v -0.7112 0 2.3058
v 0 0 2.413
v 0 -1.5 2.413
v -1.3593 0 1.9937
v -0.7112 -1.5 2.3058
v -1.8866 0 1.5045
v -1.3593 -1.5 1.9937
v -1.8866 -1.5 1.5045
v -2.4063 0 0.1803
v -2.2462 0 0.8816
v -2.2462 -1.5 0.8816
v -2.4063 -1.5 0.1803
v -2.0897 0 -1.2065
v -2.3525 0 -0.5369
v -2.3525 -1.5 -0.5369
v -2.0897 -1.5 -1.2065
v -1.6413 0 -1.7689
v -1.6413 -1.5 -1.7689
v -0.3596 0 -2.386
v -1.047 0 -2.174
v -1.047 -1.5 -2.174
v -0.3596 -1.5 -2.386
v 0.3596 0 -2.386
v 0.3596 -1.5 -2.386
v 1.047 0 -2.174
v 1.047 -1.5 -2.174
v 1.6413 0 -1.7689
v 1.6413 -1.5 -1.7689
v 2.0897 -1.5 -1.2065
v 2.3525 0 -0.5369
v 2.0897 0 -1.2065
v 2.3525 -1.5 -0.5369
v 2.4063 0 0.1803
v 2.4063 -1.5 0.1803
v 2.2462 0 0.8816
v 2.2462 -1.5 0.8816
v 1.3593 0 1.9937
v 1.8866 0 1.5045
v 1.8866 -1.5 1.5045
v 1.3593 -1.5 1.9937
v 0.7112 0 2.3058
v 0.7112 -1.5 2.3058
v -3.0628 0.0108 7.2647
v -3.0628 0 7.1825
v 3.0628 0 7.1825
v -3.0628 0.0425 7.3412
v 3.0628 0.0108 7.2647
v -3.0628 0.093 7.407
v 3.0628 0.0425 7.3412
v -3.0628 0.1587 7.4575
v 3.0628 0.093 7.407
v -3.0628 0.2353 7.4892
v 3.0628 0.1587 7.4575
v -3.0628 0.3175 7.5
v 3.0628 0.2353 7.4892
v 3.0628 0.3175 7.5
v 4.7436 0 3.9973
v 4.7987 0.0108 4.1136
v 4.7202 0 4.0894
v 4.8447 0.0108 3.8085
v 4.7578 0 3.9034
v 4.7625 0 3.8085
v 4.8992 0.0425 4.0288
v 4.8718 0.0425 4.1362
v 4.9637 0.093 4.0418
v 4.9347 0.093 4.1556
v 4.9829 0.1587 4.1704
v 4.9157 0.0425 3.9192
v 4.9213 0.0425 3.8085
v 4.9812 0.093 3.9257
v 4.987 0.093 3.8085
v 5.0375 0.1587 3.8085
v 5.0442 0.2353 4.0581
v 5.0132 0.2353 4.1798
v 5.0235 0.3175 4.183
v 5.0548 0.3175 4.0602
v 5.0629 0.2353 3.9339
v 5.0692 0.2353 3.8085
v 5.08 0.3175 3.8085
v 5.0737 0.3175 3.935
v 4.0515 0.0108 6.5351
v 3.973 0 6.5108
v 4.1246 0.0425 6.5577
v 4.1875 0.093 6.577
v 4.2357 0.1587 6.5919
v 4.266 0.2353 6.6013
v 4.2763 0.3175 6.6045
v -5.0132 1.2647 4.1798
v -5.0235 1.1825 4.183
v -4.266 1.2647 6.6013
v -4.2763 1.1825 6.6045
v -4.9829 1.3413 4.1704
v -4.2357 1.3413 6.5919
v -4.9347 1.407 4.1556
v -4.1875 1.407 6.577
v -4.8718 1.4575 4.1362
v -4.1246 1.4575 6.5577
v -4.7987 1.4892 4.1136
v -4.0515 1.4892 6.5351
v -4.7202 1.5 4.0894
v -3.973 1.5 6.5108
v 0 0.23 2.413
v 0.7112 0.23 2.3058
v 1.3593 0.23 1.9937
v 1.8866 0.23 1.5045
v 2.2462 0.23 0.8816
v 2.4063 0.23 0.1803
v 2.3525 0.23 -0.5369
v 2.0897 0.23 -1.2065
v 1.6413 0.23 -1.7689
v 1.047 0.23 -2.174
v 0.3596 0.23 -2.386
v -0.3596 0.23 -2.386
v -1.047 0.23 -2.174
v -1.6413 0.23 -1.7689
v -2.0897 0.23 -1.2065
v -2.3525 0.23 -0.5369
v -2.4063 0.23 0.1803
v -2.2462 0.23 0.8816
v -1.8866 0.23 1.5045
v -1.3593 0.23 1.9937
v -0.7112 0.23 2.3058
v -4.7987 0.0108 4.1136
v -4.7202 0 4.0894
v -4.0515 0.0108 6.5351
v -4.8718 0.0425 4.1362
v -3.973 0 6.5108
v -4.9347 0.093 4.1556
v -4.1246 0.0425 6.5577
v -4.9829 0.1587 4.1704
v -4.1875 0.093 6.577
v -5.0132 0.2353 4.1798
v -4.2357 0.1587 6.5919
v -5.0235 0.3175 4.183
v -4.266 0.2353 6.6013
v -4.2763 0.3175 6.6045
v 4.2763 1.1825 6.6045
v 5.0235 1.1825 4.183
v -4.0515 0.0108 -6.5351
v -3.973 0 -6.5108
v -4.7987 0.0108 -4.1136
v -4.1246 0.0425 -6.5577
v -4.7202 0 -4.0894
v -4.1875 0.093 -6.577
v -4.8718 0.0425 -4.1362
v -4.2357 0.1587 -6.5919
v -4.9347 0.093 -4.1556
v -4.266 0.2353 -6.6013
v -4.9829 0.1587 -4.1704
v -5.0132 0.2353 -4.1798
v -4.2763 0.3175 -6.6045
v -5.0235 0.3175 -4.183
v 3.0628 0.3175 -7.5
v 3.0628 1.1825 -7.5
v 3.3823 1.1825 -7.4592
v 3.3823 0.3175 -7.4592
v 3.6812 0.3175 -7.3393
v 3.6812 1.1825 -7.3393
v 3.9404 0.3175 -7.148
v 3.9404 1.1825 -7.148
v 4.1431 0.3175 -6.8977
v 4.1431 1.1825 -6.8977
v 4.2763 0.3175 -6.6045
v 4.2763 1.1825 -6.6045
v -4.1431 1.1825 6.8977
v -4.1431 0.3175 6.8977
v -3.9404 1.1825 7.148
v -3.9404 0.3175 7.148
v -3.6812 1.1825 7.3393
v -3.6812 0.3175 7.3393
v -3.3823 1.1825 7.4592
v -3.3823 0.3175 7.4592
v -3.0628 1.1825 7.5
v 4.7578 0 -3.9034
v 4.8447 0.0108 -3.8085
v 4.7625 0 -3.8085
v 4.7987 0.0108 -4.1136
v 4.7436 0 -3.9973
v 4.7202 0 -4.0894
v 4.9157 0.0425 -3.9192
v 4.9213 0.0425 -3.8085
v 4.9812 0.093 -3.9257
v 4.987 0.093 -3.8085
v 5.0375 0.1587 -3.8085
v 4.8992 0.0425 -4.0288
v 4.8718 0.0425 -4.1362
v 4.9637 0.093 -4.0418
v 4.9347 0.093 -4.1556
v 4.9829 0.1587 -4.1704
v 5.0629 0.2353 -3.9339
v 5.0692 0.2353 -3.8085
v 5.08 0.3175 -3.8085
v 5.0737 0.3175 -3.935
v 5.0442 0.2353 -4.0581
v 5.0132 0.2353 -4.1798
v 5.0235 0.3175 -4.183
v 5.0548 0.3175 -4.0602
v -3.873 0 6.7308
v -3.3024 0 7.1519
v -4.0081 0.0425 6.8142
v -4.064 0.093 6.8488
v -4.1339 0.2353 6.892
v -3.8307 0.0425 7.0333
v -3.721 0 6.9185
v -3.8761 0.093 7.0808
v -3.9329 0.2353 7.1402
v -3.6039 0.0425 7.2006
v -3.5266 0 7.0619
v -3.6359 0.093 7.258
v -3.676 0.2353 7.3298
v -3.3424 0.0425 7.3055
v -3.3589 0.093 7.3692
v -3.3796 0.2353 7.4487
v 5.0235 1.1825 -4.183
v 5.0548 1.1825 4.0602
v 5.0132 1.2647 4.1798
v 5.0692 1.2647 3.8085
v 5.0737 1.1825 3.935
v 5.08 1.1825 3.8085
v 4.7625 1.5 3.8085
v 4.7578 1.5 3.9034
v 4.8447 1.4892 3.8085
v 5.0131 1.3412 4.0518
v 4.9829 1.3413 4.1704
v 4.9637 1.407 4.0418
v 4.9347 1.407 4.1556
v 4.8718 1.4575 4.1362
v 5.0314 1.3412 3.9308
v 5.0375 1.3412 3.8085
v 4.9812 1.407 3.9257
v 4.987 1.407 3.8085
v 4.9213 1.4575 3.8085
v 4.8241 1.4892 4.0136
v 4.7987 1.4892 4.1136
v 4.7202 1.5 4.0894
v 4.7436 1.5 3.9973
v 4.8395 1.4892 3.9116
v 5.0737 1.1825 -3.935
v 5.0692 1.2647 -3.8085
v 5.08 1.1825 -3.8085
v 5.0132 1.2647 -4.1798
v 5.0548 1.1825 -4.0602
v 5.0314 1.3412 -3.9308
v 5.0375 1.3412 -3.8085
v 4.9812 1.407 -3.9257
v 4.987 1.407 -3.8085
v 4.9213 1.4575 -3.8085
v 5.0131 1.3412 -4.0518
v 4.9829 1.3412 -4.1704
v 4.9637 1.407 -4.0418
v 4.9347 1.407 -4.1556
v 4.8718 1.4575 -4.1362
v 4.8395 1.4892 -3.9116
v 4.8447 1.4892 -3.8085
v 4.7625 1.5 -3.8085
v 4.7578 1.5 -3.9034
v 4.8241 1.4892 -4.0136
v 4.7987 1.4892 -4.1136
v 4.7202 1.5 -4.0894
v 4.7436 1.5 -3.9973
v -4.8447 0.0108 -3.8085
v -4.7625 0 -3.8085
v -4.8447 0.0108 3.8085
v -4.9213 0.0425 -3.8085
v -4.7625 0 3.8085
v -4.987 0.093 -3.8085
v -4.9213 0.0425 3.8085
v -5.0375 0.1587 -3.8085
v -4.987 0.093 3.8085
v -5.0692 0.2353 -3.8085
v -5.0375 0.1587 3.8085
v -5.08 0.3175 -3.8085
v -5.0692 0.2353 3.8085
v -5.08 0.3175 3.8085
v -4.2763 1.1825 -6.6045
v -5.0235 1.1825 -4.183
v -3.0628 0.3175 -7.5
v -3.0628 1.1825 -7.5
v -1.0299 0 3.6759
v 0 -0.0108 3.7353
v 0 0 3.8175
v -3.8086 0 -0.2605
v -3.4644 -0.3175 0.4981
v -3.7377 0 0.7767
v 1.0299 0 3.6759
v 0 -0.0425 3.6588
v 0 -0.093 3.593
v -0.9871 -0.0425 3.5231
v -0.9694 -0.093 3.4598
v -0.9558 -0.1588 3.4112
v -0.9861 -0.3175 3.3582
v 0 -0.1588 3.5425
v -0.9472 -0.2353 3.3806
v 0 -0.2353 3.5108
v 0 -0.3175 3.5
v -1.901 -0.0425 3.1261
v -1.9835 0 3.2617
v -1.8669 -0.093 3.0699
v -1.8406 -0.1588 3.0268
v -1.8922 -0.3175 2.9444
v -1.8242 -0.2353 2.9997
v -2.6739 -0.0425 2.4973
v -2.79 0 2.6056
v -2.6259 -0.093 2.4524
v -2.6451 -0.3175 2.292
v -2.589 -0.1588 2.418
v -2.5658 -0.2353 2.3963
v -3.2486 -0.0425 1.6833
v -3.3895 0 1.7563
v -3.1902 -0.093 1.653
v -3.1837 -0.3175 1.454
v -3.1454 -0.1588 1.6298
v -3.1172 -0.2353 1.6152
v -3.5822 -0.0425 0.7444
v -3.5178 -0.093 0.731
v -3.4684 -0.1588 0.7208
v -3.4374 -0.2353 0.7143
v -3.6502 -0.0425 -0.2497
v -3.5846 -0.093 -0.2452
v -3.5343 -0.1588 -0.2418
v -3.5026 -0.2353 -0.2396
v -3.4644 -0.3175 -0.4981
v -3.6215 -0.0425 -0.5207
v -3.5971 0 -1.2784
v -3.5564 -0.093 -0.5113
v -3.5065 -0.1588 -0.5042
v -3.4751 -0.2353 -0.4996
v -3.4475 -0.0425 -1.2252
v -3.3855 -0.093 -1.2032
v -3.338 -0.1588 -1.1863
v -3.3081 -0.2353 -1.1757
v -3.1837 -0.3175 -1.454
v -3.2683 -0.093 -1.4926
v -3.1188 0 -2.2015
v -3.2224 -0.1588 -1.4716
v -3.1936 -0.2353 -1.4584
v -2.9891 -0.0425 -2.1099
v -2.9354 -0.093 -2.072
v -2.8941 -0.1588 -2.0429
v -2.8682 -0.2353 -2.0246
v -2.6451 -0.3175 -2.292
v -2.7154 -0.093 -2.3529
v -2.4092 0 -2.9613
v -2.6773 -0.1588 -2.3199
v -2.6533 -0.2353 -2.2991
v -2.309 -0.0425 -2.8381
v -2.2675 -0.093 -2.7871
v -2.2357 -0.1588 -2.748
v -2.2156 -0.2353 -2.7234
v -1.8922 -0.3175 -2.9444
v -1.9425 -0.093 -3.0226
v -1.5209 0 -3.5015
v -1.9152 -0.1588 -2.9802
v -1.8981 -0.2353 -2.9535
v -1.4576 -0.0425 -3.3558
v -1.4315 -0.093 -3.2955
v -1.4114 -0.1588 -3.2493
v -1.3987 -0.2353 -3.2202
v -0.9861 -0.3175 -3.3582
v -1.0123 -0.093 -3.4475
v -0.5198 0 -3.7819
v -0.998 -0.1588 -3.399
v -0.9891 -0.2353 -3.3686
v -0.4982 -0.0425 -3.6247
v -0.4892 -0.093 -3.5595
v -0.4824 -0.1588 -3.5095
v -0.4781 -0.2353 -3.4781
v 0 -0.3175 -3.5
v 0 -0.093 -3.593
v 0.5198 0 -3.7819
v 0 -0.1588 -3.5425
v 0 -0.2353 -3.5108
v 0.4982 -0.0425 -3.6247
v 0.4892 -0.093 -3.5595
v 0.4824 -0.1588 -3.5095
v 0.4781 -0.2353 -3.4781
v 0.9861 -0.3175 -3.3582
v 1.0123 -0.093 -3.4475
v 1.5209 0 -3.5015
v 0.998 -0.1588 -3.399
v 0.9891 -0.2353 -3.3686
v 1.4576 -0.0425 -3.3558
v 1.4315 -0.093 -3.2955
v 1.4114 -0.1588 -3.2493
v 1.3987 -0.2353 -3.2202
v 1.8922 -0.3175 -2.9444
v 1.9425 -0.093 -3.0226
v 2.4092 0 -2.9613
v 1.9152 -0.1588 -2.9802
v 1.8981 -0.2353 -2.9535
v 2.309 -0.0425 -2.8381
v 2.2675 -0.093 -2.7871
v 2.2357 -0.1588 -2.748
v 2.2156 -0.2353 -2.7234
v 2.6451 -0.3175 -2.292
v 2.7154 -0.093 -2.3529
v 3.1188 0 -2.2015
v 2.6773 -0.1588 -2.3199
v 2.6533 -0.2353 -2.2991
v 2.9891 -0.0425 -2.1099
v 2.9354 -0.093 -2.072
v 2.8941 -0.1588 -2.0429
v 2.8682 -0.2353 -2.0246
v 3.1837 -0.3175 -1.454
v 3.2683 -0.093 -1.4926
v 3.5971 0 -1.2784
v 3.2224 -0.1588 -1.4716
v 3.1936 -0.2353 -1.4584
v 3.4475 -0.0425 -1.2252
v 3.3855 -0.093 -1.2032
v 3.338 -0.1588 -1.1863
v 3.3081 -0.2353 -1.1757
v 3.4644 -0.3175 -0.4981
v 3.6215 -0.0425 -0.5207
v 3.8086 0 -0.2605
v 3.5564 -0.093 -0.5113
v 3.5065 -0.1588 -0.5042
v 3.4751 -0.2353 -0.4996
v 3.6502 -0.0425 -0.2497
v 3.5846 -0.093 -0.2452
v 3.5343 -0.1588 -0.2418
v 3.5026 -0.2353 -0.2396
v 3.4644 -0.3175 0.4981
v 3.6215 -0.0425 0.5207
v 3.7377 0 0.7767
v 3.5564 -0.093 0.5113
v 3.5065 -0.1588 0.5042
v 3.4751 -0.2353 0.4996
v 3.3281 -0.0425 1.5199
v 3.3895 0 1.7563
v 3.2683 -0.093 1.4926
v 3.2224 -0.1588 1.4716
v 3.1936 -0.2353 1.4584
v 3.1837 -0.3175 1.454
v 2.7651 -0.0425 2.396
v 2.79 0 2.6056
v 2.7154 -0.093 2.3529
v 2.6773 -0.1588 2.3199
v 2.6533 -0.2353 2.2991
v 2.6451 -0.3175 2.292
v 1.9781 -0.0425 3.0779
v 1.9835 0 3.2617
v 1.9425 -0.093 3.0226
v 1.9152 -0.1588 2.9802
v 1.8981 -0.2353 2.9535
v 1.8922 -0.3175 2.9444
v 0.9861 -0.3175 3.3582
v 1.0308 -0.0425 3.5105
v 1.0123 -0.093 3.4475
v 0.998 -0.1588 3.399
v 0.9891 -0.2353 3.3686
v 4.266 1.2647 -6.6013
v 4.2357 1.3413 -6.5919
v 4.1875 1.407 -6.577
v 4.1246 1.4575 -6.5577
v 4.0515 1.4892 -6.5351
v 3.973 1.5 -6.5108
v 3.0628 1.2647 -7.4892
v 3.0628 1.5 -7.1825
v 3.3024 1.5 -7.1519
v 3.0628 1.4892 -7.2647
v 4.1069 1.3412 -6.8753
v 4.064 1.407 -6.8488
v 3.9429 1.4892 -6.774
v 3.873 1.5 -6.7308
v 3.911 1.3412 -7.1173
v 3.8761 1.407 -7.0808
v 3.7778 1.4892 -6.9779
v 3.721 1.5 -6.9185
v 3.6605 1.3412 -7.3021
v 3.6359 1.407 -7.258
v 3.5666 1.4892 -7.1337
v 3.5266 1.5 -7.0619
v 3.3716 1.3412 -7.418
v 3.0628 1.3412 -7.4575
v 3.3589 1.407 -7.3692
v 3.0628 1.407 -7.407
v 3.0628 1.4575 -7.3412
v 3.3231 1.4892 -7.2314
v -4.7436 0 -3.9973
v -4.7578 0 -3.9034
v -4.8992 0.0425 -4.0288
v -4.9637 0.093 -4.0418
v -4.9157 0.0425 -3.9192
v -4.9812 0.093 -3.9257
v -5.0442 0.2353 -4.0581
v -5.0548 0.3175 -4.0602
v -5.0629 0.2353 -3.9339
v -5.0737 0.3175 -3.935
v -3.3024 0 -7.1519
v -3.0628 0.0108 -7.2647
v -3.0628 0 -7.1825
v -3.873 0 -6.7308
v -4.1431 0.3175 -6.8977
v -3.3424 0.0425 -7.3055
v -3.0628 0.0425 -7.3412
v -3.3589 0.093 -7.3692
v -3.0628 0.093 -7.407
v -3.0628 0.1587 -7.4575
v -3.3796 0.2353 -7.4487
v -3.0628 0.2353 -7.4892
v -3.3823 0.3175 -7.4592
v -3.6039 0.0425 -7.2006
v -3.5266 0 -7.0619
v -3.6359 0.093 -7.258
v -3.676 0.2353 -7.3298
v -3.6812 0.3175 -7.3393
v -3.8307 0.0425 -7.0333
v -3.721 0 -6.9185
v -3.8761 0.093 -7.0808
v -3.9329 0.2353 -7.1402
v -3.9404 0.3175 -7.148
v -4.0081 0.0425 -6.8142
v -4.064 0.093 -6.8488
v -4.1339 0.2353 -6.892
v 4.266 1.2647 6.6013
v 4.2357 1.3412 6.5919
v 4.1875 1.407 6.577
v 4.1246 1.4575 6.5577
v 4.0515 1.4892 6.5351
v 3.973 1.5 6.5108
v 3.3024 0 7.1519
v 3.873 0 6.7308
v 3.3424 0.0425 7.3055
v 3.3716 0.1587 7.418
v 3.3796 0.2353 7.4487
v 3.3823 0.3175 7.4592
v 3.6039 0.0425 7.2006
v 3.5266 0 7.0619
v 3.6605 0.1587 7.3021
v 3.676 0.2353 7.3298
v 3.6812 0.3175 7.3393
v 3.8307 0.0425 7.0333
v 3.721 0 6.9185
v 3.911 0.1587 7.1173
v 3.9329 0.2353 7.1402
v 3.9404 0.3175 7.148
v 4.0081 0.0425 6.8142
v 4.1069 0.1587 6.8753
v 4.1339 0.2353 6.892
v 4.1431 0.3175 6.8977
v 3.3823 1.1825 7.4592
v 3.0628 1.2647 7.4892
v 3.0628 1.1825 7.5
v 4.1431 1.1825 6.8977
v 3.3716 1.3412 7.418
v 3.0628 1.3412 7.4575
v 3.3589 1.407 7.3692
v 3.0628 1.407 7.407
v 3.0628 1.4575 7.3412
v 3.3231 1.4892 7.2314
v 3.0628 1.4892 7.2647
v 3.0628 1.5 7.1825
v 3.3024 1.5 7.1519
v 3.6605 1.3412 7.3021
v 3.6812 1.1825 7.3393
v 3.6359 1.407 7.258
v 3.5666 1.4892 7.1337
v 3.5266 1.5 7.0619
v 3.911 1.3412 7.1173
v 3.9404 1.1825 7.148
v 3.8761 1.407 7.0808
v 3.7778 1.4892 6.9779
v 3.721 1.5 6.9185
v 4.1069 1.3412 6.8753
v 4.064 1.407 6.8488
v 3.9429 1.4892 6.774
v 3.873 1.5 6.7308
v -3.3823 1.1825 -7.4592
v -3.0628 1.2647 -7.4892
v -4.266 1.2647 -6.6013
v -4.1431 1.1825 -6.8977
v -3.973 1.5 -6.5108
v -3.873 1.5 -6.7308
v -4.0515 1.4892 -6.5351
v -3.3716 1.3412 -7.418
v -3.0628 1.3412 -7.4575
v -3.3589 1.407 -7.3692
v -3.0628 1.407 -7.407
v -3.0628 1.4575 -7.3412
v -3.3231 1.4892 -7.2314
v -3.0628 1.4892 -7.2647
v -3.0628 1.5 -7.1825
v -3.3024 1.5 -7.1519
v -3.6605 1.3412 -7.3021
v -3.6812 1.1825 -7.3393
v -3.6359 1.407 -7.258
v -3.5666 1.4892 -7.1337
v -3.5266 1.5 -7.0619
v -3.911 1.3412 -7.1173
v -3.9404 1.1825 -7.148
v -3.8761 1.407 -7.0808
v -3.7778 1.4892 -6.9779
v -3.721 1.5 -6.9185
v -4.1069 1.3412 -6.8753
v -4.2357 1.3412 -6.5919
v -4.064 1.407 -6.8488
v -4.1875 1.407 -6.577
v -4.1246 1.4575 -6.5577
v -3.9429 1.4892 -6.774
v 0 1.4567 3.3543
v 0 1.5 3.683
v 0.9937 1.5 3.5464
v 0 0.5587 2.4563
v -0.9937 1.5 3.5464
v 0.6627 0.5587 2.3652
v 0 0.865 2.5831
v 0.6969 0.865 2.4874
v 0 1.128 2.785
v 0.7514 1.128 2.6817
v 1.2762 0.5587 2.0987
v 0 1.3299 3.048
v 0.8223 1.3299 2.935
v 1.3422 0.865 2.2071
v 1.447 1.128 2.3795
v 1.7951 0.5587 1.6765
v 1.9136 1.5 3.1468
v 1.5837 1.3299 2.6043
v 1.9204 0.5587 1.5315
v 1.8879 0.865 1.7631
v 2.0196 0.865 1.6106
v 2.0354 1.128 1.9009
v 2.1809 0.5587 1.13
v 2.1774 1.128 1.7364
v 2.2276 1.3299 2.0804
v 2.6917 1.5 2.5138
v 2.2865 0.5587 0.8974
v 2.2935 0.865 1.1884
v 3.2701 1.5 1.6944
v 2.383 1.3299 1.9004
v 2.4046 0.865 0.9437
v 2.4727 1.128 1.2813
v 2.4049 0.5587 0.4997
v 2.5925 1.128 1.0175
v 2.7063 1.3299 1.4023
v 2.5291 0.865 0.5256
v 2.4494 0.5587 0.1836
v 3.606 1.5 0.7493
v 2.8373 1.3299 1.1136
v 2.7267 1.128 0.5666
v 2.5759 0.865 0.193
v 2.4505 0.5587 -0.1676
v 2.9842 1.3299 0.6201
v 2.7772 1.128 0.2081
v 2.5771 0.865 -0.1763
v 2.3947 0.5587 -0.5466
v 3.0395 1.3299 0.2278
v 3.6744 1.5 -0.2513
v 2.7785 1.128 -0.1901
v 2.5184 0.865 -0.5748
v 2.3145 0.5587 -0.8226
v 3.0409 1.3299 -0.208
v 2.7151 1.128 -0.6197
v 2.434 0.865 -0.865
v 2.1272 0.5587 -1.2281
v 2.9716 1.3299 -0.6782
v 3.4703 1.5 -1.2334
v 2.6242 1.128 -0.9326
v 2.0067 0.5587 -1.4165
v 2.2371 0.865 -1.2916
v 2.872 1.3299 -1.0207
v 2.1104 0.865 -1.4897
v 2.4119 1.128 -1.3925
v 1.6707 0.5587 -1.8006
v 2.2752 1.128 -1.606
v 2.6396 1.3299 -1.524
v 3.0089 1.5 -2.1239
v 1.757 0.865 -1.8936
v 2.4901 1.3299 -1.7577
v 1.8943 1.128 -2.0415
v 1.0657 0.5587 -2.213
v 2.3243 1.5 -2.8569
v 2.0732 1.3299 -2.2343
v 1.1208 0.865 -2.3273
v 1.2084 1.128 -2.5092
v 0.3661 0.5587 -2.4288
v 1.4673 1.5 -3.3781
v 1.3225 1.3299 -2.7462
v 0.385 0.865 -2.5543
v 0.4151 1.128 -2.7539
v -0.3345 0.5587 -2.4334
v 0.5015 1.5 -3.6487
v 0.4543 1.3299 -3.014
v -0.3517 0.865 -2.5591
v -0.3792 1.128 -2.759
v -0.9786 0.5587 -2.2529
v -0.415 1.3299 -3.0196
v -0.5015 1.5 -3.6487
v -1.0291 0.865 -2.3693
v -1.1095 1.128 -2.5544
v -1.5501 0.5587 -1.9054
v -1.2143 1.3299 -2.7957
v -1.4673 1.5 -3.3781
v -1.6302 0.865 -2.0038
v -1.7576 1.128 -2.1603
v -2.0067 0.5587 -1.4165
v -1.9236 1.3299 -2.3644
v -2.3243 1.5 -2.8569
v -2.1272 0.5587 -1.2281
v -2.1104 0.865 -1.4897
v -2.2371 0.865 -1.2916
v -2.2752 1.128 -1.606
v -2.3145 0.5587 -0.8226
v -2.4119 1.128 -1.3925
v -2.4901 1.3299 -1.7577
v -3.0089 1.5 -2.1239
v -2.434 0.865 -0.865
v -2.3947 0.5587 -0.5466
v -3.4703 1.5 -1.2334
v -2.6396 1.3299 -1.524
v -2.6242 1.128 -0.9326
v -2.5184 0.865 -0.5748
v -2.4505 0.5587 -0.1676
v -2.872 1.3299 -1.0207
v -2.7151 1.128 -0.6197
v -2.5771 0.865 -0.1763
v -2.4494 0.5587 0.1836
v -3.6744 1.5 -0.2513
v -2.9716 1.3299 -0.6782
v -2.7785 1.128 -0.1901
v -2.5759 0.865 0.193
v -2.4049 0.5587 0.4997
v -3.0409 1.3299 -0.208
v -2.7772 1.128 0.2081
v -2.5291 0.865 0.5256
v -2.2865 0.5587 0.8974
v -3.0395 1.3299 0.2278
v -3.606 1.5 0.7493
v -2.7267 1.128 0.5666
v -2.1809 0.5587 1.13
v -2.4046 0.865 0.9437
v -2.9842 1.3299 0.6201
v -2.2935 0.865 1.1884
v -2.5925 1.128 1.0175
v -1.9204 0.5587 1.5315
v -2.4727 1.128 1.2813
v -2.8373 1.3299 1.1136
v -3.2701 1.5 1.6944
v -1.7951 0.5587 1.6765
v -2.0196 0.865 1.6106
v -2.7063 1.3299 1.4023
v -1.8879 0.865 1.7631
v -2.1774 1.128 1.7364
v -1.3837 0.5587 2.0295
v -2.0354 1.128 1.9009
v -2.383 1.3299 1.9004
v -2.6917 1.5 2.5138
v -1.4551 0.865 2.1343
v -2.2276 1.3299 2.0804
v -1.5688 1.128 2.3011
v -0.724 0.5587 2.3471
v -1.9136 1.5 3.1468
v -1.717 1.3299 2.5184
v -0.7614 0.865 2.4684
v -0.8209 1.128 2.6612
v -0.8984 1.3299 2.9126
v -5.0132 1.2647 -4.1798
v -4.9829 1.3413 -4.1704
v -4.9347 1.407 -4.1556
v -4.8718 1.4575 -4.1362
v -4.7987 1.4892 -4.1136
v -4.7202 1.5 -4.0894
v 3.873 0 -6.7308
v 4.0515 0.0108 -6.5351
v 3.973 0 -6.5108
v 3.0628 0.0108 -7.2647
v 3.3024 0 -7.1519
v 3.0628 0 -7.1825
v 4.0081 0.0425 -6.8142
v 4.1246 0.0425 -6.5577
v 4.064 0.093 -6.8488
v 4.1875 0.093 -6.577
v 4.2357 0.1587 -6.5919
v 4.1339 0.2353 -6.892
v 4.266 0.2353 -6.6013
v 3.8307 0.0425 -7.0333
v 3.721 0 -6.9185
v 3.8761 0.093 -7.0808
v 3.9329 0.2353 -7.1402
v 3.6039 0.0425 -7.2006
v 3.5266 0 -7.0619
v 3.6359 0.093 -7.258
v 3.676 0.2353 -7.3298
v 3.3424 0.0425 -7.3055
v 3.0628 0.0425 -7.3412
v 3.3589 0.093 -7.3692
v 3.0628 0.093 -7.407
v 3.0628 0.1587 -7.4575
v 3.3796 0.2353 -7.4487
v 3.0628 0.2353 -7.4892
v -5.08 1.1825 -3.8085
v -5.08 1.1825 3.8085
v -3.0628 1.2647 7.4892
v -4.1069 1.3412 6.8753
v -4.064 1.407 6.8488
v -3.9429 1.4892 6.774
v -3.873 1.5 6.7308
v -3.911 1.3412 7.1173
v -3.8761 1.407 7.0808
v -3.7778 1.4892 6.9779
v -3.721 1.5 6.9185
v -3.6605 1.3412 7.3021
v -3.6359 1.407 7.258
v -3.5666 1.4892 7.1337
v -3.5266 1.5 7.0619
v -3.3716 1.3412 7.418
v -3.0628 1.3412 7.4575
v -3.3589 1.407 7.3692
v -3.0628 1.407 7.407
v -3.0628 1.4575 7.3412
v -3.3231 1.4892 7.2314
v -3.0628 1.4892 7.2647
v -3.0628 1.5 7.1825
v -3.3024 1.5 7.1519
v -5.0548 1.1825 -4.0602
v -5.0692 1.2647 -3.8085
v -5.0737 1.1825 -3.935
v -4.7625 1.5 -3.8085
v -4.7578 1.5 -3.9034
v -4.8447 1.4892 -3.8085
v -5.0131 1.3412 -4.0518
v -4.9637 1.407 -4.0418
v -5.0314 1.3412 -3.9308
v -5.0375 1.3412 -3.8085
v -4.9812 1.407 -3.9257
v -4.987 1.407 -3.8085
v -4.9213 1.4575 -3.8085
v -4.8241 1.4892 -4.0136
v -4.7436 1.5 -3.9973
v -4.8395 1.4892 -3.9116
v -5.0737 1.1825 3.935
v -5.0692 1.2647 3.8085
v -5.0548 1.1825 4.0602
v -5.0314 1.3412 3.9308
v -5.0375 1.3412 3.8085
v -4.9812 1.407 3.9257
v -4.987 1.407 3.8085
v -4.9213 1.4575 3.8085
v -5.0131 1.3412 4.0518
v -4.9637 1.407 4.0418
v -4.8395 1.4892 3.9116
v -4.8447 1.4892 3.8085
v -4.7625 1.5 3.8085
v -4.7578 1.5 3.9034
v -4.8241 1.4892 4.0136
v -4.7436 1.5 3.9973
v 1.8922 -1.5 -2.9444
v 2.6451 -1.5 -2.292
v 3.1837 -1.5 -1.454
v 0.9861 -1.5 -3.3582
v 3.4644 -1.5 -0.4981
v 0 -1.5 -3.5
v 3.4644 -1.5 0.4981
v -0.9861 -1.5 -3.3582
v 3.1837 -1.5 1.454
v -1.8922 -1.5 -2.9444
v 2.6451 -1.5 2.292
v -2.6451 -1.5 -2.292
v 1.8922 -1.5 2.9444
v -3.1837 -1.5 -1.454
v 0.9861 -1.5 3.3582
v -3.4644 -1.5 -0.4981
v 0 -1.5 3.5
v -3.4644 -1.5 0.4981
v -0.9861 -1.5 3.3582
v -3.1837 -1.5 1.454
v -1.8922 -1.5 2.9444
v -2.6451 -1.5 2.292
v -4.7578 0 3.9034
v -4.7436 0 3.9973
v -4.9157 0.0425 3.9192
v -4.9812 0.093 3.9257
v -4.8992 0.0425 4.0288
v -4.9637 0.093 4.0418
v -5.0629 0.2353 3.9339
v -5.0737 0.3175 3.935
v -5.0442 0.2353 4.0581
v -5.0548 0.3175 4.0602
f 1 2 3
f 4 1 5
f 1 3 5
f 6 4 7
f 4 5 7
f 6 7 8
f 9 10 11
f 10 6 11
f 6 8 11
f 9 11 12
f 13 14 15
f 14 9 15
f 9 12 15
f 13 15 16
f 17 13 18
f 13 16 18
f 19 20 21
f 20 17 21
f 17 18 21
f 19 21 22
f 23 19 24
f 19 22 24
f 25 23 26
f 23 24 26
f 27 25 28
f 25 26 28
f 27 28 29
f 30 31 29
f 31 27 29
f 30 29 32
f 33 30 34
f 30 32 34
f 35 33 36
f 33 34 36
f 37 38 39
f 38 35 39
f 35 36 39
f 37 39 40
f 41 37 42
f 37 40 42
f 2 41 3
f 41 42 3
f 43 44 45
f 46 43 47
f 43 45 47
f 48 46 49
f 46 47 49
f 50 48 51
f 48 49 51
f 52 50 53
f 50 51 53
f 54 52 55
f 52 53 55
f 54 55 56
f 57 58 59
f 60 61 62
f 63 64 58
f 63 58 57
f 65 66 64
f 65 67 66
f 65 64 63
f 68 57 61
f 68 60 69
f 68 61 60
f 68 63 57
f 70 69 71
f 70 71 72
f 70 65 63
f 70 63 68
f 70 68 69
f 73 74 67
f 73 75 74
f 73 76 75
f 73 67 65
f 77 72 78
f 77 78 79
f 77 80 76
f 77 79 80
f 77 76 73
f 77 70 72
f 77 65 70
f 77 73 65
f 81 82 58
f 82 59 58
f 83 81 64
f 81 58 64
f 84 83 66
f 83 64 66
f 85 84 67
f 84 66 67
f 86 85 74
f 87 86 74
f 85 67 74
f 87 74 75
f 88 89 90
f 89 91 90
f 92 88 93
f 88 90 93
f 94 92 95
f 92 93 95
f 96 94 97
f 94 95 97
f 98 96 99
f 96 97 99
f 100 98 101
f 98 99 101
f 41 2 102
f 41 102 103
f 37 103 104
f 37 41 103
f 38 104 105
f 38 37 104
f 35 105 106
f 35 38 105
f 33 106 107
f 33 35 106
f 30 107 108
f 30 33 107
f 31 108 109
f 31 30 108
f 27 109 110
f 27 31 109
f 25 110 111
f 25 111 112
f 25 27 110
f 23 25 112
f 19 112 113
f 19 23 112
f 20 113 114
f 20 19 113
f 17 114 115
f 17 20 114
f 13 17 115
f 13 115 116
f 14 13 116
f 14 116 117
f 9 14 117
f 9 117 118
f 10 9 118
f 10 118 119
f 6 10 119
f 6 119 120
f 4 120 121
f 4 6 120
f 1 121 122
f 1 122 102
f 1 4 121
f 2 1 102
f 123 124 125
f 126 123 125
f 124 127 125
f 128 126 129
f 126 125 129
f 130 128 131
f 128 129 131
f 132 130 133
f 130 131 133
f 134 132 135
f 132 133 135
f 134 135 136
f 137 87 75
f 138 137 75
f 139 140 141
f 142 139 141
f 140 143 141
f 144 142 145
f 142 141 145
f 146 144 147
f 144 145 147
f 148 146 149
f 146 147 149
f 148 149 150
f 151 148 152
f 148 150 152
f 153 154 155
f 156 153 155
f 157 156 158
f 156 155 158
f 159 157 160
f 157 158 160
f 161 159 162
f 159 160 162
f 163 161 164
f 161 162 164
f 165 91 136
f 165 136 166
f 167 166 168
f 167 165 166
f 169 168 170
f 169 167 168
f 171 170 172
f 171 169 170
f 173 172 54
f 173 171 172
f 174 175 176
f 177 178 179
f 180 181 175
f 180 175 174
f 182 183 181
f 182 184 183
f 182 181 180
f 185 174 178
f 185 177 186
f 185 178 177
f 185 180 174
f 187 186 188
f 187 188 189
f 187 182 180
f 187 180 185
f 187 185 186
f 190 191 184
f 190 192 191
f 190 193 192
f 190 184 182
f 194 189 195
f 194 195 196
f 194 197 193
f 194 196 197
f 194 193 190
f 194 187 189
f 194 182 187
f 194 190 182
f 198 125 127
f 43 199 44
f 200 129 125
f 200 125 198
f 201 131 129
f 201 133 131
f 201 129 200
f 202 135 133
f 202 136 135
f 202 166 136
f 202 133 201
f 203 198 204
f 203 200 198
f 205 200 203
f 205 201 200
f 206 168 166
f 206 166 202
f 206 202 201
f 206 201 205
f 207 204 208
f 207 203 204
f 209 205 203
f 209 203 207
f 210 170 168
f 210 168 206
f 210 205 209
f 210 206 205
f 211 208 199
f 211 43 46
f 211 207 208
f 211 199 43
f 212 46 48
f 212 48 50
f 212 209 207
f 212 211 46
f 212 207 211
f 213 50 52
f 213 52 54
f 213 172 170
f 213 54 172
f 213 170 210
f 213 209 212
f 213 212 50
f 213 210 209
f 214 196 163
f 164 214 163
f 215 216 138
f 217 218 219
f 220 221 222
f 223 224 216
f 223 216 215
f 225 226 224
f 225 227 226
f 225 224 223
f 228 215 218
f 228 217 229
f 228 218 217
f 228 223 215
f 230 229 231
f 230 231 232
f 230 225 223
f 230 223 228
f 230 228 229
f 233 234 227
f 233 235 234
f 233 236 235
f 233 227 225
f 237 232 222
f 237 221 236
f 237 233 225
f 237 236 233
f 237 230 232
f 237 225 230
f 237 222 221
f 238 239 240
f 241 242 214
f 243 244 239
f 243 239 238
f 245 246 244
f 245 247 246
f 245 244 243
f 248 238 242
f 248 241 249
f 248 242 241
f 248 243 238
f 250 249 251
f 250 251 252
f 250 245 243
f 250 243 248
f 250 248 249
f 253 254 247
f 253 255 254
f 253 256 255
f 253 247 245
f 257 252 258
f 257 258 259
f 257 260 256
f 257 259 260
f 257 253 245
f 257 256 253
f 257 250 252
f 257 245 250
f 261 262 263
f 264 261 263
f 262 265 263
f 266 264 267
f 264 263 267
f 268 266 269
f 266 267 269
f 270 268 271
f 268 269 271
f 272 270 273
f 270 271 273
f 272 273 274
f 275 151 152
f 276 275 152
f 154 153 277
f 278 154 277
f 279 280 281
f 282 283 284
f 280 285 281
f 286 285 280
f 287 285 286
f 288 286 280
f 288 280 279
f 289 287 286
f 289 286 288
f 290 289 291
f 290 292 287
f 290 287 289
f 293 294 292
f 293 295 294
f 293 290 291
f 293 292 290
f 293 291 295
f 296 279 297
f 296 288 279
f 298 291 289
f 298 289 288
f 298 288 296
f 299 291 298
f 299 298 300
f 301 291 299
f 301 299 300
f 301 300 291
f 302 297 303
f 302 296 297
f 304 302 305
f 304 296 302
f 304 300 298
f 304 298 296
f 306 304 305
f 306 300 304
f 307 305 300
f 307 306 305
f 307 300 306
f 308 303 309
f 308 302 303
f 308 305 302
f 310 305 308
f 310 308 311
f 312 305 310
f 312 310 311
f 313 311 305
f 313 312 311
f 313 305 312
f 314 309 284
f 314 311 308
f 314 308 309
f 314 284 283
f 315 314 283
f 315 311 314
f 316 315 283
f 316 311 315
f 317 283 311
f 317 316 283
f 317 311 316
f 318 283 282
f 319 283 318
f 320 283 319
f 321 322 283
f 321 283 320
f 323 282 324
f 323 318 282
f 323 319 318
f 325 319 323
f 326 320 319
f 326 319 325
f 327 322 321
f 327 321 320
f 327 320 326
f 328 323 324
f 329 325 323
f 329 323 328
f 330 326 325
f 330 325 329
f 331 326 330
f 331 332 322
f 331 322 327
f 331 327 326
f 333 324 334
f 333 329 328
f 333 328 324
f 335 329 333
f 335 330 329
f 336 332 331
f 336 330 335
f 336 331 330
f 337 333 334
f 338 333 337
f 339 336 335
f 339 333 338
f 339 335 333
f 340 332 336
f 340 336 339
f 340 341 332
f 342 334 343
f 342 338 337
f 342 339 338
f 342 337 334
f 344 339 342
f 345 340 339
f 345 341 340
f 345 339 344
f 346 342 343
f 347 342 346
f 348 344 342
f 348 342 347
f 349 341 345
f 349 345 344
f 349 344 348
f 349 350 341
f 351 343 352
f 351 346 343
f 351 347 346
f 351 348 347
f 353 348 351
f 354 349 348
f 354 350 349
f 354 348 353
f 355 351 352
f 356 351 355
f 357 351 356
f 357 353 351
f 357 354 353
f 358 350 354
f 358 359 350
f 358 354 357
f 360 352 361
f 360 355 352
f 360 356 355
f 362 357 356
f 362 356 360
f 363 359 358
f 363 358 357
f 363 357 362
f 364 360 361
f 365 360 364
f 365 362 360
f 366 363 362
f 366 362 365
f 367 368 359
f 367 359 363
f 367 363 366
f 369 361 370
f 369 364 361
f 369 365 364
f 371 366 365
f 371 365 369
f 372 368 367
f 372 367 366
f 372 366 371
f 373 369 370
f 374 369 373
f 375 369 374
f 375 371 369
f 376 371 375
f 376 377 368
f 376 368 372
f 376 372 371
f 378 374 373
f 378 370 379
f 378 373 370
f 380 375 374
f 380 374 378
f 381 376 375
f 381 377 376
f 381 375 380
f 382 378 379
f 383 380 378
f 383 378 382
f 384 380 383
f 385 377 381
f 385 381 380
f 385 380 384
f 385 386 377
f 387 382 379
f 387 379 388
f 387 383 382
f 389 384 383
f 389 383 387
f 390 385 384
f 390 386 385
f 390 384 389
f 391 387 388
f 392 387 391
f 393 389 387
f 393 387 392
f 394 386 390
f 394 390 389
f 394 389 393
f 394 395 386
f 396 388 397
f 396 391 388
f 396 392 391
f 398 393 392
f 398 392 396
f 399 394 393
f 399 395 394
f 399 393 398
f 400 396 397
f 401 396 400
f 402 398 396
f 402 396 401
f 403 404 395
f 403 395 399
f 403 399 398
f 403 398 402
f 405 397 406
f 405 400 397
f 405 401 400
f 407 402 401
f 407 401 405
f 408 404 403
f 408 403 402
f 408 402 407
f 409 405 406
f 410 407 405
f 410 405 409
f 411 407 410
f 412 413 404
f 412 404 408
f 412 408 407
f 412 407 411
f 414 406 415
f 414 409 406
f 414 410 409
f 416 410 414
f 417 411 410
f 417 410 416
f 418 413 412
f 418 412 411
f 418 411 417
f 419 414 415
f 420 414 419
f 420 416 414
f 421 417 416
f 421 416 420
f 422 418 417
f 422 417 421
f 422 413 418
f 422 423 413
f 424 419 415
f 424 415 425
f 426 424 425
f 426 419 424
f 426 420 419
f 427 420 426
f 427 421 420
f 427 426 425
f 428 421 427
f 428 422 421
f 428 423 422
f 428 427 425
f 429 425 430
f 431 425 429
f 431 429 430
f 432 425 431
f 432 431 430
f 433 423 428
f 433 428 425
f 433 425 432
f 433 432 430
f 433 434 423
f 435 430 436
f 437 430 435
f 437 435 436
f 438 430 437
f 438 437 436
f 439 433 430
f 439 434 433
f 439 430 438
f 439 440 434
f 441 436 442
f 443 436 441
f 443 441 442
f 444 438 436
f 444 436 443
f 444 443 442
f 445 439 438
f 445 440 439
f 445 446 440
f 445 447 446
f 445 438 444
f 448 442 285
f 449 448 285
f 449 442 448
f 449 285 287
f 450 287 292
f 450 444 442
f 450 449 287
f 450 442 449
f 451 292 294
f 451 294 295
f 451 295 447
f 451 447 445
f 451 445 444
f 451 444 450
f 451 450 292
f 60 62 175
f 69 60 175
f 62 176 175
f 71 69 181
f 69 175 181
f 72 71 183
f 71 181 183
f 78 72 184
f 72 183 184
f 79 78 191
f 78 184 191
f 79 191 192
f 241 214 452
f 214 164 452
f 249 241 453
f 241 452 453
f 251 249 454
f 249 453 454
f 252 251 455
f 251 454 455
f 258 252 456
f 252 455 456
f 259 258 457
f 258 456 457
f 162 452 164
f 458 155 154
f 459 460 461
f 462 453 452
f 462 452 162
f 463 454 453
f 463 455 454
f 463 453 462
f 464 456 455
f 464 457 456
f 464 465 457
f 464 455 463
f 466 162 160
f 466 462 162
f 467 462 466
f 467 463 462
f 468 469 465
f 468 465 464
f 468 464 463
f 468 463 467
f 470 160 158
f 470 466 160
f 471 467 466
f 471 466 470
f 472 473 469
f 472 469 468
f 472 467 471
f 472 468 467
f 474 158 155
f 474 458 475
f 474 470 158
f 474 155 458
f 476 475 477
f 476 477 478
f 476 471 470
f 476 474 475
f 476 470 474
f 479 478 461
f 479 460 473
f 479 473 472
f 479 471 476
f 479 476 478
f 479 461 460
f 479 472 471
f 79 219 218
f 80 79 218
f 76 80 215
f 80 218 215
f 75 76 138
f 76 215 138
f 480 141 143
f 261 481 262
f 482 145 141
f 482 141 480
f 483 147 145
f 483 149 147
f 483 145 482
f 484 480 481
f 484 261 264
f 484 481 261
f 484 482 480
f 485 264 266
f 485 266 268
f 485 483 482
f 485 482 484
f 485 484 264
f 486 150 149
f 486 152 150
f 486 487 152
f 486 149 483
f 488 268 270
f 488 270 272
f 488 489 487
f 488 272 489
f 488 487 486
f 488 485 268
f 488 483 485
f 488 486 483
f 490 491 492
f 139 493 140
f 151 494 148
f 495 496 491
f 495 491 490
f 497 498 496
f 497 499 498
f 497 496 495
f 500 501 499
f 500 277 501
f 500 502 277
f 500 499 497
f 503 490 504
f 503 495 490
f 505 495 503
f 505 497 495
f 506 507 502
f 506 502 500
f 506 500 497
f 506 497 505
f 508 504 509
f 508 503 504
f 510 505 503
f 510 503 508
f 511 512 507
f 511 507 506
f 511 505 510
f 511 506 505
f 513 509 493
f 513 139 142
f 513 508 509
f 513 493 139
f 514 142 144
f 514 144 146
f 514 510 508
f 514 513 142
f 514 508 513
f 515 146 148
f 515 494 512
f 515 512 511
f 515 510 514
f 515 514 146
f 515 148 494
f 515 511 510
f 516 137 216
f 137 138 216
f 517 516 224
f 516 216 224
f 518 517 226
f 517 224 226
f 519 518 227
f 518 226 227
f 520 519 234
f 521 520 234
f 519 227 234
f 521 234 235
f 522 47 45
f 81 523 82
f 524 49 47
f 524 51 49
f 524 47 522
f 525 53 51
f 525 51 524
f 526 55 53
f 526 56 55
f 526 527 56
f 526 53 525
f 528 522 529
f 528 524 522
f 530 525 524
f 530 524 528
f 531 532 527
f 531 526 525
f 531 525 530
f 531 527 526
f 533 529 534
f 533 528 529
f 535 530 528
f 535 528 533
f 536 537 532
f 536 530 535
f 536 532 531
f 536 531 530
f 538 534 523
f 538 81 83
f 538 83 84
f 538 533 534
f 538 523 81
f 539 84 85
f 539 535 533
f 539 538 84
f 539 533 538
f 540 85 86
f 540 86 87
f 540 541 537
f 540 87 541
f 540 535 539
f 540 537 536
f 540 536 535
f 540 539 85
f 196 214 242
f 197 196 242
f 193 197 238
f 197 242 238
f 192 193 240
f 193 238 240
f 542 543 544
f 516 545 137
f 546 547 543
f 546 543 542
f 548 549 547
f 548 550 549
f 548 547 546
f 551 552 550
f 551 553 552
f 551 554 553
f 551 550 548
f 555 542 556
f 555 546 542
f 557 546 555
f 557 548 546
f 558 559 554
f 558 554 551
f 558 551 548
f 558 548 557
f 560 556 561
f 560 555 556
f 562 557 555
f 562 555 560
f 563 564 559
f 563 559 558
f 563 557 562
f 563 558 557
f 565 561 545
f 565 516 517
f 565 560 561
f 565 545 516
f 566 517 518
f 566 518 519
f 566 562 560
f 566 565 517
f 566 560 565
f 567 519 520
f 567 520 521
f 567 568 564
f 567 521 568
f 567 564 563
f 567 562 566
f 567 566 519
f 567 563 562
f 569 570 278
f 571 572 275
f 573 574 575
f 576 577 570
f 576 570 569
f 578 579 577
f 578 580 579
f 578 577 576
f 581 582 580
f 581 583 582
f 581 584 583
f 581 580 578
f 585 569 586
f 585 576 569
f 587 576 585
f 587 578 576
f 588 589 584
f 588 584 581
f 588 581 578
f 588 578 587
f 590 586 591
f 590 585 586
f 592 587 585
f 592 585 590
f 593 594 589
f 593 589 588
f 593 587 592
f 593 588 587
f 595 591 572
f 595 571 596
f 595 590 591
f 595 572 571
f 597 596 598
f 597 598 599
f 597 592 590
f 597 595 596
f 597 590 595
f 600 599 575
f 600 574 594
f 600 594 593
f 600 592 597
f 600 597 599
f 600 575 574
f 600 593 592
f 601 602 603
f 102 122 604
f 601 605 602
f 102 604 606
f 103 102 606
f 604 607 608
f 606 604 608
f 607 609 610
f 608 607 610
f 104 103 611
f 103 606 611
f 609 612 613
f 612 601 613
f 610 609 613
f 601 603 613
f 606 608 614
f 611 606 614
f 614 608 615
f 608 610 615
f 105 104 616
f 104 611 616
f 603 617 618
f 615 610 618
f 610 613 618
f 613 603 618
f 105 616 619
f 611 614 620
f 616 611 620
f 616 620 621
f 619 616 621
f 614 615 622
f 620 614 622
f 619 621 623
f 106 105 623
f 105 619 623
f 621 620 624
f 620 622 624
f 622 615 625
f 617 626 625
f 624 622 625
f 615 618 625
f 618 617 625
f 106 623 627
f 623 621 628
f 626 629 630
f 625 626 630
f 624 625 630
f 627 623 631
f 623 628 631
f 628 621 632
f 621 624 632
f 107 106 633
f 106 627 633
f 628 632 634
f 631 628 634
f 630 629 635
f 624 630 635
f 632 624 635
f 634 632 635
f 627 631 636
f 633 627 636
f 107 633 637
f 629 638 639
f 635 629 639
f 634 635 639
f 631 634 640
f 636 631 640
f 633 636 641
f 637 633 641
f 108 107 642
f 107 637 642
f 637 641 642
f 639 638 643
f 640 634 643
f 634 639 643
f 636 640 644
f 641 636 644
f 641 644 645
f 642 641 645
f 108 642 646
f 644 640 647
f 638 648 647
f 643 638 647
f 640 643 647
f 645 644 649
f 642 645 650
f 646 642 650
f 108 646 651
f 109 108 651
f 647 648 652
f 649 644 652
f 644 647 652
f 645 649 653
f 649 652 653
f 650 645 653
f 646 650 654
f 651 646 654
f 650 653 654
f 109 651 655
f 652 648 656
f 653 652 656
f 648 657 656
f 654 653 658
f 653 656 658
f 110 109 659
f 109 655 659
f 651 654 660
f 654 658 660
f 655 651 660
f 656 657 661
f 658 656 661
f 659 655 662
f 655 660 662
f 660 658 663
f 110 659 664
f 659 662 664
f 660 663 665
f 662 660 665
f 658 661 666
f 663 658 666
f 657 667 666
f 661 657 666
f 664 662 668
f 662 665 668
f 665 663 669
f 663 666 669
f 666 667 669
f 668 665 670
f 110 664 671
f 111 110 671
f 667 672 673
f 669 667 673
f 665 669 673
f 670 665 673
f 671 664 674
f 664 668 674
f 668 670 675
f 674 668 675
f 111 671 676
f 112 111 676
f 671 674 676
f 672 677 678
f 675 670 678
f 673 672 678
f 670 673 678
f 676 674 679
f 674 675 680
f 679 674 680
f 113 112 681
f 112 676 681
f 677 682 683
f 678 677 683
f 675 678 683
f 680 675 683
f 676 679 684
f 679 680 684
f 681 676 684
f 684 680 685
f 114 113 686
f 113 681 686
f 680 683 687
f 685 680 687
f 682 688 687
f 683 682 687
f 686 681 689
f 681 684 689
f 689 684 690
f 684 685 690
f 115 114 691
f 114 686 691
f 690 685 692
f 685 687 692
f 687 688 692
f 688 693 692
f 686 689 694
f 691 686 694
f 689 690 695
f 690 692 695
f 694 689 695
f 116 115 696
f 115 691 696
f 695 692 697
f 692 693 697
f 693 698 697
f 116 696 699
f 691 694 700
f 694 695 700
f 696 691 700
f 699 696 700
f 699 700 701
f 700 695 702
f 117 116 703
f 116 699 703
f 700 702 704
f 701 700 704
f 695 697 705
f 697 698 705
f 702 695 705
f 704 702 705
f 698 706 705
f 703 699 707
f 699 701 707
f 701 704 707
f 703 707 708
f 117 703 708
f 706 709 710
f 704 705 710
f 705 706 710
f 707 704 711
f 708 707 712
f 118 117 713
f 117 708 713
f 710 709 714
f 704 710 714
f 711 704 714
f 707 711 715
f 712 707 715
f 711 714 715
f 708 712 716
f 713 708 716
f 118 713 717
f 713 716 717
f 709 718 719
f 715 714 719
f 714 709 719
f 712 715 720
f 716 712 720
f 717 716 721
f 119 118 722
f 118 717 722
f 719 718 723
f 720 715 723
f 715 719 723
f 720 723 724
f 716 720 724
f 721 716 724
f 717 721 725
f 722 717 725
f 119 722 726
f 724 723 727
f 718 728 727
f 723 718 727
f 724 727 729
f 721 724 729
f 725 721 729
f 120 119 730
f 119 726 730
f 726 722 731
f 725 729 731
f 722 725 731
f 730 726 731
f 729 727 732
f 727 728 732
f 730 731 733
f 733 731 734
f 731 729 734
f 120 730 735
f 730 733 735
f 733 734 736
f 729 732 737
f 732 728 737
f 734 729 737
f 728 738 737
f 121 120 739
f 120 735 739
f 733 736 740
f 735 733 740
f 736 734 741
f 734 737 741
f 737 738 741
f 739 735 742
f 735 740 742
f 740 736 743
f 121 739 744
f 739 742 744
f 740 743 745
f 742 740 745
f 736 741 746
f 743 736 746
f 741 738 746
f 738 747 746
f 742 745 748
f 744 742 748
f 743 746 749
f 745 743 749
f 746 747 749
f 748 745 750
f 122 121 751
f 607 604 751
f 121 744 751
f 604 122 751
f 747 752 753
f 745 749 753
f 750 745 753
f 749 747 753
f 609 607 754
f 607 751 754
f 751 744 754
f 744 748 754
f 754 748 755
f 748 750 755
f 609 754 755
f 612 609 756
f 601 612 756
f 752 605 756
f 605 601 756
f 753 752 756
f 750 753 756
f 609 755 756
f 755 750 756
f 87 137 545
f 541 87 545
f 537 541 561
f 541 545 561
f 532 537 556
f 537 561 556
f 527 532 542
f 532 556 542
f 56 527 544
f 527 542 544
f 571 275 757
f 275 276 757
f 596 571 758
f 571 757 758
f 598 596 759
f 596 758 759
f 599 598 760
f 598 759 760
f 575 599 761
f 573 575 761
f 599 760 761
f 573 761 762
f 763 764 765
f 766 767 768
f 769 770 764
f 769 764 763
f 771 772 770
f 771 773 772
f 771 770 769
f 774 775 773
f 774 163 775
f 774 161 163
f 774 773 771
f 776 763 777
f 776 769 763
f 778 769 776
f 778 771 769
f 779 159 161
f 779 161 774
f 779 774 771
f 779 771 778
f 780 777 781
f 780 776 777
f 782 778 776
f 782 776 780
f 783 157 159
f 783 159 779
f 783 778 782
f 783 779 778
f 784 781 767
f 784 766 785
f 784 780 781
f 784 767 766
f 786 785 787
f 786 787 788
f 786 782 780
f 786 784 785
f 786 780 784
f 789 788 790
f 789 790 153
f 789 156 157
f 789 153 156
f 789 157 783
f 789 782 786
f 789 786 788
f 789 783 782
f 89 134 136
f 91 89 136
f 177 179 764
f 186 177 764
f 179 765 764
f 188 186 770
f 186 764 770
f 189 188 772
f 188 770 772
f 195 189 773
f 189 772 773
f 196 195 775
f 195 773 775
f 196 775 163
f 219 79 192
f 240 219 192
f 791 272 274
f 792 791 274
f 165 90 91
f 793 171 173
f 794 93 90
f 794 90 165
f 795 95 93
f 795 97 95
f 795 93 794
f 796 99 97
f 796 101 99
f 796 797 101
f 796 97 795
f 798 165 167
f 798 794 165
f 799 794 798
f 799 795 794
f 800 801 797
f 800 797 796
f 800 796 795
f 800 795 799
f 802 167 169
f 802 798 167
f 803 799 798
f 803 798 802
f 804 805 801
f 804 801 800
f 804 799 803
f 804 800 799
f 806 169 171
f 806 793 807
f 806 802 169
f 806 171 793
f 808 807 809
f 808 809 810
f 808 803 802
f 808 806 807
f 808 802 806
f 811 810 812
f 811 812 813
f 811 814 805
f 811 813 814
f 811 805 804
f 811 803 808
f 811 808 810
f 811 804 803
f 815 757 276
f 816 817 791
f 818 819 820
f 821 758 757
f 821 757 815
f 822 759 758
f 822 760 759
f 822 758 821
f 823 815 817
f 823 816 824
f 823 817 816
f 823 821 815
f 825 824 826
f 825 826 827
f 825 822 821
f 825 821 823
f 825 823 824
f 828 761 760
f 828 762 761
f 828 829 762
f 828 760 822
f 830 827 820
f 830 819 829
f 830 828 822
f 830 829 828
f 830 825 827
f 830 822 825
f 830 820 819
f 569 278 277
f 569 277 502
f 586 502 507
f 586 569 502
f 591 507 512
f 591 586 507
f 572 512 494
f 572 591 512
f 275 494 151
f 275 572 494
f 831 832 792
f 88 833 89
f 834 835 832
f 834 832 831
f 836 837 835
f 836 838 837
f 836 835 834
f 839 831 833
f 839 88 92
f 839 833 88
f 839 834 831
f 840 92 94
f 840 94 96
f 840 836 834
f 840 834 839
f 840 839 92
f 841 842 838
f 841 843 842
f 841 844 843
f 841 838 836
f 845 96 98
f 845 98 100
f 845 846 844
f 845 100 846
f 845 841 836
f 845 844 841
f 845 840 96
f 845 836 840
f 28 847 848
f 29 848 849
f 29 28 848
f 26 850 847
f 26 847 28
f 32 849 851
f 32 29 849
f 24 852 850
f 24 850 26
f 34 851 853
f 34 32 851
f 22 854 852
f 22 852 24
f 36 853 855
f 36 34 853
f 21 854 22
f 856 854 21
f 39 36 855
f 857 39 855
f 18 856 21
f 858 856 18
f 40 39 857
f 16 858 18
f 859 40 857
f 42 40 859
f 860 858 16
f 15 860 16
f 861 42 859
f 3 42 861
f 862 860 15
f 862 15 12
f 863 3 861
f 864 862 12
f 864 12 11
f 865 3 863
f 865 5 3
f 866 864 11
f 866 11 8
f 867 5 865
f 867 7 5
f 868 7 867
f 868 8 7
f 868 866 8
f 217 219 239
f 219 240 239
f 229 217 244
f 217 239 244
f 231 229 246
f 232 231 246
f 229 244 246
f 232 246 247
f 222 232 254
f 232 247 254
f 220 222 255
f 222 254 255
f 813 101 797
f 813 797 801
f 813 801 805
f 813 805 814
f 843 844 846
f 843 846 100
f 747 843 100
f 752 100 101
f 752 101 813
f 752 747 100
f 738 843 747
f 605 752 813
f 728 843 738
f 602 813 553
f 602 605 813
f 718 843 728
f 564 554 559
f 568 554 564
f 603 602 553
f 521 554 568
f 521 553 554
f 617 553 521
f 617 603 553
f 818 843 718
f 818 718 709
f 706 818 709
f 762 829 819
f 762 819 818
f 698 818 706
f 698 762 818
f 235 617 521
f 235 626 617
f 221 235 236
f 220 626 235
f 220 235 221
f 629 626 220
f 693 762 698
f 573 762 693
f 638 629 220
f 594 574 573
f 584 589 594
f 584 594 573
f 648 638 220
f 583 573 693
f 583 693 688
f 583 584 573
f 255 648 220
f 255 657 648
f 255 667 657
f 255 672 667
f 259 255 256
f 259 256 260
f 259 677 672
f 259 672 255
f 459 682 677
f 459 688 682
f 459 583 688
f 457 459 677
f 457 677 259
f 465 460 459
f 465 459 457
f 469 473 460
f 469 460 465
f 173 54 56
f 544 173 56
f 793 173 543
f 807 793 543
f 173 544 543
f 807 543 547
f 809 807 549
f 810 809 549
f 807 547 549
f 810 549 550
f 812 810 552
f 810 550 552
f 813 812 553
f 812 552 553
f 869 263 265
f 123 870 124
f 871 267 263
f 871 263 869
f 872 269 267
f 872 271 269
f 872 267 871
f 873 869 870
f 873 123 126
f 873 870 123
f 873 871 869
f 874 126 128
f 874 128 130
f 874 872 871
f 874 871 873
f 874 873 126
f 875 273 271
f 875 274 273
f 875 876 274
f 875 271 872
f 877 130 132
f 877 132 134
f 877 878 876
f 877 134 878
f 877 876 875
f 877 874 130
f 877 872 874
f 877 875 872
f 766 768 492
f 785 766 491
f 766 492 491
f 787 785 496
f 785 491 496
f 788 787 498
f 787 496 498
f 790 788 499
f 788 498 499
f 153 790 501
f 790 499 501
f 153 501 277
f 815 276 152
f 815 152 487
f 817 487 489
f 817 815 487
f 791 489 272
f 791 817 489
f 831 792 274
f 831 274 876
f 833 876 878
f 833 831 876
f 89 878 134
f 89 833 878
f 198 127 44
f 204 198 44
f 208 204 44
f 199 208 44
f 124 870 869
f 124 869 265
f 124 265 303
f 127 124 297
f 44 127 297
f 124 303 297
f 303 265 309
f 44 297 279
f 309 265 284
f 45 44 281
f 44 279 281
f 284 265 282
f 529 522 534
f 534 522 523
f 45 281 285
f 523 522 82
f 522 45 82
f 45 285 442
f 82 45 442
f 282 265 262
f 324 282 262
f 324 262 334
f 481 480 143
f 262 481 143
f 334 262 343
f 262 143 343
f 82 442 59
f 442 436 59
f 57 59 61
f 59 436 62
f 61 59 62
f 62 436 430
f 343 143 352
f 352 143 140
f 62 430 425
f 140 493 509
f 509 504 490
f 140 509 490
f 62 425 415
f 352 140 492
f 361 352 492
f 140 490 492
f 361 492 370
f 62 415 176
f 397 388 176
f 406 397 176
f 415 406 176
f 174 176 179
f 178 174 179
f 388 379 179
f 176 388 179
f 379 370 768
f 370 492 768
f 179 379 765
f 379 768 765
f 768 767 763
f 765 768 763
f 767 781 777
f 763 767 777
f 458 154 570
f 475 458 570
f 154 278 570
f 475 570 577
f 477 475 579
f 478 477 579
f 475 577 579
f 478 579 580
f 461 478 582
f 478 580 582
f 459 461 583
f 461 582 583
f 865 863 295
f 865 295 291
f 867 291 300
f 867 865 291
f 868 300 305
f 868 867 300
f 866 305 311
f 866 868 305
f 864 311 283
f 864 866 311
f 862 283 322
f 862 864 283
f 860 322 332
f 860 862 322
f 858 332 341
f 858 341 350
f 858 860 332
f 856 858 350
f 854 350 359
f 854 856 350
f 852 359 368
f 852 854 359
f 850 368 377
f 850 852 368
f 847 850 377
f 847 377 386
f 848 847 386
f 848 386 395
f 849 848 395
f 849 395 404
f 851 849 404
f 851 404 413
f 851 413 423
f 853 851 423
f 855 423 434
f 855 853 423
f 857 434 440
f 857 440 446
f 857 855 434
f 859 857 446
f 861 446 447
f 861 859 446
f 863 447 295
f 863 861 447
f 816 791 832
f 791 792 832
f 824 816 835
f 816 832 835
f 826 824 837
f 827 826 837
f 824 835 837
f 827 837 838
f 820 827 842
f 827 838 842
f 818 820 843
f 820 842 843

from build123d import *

# Parameters (mm, degrees)
SKETCH1_R           = 2.413
BOSS_EXTRUDE1_DEPTH = 1.5
BOSS_EXTRUDE2_START = 1.5
SKETCH2_R           = 3.5
SKETCH2_R_2         = 2.413
BOSS_EXTRUDE2_DEPTH = 1.5
FILLET1_R           = 1.27
FILLET2_R           = 0.3175


with BuildPart() as part:
    # Sketch1 → Boss-Extrude1 (new body)
    with BuildSketch(Plane(origin=(0, 0, 0), x_dir=(1, 0, 0), z_dir=(0, 1, 0))):
        Polygon((4, 7.5), (-4, 7.5), (-5.08, 4), (-5.08, -4), (-4, -7.5), (4, -7.5), (5.08, -4), (5.08, 4), align=None)
        with Locations(Location((0, 0, 0), (0, 0, 270))):
            Circle(SKETCH1_R, mode=Mode.SUBTRACT)
    extrude(amount=BOSS_EXTRUDE1_DEPTH)

    # Sketch2 → Boss-Extrude2 (add)
    with BuildSketch(Plane.XZ.offset(BOSS_EXTRUDE2_START)):
        with Locations(Location((0, 0, 0), (0, 0, 90))):
            Circle(SKETCH2_R)
        with Locations(Location((0, 0, 0), (0, 0, 90))):
            Circle(SKETCH2_R_2, mode=Mode.SUBTRACT)
    extrude(amount=-BOSS_EXTRUDE2_DEPTH)

    # Fillet1
    fillet1_edges = [part.edges().sort_by_distance(p)[0] for p in [
        (-5.08, 0.75, 4),
        (-5.08, 0.75, -4),
        (-4, 0.75, -7.5),
        (4, 0.75, -7.5),
        (5.08, 0.75, -4),
        (5.08, 0.75, 4),
        (4, 0.75, 7.5),
        (-4, 0.75, 7.5),
        (0, 1.5, -2.413),
    ]]
    fillet(fillet1_edges, radius=FILLET1_R)

    # Fillet2
    fillet2_edges = [part.edges().sort_by_distance(p)[0] for p in [
        (0, 0, -3.5),
        (-4.64993803, 1.5, 5.393719347),
        (0, 1.5, 7.5),
        (4.64993803, 1.5, 5.393719347),
        (5.08, 1.5, 0),
        (4.64993803, 1.5, -5.393719347),
        (0, 1.5, -7.5),
        (-4.64993803, 1.5, -5.393719347),
        (-5.08, 1.5, 0),
        (5.065805445, 1.5, 3.997859771),
        (5.065805445, 1.5, -3.997859771),
        (3.816897156, 1.5, -7.251877837),
        (-3.816897156, 1.5, -7.251877837),
        (-5.065805445, 1.5, -3.997859771),
        (-5.065805445, 1.5, 3.997859771),
        (-3.816897156, 1.5, 7.251877837),
        (3.816897156, 1.5, 7.251877837),
        (4.64993803, 0, 5.393719347),
        (-4.64993803, 0, 5.393719347),
        (-5.08, 0, 0),
        (-4.64993803, 0, -5.393719347),
        (0, 0, -7.5),
        (4.64993803, 0, -5.393719347),
        (5.08, 0, 0),
        (0, 0, 7.5),
        (5.065805445, 0, 3.997859771),
        (5.065805445, 0, -3.997859771),
        (3.816897156, 0, -7.251877837),
        (-3.816897156, 0, -7.251877837),
        (-5.065805445, 0, -3.997859771),
        (-5.065805445, 0, 3.997859771),
        (-3.816897156, 0, 7.251877837),
        (3.816897156, 0, 7.251877837),
    ]]
    fillet(fillet2_edges, radius=FILLET2_R)


solid = part.part
